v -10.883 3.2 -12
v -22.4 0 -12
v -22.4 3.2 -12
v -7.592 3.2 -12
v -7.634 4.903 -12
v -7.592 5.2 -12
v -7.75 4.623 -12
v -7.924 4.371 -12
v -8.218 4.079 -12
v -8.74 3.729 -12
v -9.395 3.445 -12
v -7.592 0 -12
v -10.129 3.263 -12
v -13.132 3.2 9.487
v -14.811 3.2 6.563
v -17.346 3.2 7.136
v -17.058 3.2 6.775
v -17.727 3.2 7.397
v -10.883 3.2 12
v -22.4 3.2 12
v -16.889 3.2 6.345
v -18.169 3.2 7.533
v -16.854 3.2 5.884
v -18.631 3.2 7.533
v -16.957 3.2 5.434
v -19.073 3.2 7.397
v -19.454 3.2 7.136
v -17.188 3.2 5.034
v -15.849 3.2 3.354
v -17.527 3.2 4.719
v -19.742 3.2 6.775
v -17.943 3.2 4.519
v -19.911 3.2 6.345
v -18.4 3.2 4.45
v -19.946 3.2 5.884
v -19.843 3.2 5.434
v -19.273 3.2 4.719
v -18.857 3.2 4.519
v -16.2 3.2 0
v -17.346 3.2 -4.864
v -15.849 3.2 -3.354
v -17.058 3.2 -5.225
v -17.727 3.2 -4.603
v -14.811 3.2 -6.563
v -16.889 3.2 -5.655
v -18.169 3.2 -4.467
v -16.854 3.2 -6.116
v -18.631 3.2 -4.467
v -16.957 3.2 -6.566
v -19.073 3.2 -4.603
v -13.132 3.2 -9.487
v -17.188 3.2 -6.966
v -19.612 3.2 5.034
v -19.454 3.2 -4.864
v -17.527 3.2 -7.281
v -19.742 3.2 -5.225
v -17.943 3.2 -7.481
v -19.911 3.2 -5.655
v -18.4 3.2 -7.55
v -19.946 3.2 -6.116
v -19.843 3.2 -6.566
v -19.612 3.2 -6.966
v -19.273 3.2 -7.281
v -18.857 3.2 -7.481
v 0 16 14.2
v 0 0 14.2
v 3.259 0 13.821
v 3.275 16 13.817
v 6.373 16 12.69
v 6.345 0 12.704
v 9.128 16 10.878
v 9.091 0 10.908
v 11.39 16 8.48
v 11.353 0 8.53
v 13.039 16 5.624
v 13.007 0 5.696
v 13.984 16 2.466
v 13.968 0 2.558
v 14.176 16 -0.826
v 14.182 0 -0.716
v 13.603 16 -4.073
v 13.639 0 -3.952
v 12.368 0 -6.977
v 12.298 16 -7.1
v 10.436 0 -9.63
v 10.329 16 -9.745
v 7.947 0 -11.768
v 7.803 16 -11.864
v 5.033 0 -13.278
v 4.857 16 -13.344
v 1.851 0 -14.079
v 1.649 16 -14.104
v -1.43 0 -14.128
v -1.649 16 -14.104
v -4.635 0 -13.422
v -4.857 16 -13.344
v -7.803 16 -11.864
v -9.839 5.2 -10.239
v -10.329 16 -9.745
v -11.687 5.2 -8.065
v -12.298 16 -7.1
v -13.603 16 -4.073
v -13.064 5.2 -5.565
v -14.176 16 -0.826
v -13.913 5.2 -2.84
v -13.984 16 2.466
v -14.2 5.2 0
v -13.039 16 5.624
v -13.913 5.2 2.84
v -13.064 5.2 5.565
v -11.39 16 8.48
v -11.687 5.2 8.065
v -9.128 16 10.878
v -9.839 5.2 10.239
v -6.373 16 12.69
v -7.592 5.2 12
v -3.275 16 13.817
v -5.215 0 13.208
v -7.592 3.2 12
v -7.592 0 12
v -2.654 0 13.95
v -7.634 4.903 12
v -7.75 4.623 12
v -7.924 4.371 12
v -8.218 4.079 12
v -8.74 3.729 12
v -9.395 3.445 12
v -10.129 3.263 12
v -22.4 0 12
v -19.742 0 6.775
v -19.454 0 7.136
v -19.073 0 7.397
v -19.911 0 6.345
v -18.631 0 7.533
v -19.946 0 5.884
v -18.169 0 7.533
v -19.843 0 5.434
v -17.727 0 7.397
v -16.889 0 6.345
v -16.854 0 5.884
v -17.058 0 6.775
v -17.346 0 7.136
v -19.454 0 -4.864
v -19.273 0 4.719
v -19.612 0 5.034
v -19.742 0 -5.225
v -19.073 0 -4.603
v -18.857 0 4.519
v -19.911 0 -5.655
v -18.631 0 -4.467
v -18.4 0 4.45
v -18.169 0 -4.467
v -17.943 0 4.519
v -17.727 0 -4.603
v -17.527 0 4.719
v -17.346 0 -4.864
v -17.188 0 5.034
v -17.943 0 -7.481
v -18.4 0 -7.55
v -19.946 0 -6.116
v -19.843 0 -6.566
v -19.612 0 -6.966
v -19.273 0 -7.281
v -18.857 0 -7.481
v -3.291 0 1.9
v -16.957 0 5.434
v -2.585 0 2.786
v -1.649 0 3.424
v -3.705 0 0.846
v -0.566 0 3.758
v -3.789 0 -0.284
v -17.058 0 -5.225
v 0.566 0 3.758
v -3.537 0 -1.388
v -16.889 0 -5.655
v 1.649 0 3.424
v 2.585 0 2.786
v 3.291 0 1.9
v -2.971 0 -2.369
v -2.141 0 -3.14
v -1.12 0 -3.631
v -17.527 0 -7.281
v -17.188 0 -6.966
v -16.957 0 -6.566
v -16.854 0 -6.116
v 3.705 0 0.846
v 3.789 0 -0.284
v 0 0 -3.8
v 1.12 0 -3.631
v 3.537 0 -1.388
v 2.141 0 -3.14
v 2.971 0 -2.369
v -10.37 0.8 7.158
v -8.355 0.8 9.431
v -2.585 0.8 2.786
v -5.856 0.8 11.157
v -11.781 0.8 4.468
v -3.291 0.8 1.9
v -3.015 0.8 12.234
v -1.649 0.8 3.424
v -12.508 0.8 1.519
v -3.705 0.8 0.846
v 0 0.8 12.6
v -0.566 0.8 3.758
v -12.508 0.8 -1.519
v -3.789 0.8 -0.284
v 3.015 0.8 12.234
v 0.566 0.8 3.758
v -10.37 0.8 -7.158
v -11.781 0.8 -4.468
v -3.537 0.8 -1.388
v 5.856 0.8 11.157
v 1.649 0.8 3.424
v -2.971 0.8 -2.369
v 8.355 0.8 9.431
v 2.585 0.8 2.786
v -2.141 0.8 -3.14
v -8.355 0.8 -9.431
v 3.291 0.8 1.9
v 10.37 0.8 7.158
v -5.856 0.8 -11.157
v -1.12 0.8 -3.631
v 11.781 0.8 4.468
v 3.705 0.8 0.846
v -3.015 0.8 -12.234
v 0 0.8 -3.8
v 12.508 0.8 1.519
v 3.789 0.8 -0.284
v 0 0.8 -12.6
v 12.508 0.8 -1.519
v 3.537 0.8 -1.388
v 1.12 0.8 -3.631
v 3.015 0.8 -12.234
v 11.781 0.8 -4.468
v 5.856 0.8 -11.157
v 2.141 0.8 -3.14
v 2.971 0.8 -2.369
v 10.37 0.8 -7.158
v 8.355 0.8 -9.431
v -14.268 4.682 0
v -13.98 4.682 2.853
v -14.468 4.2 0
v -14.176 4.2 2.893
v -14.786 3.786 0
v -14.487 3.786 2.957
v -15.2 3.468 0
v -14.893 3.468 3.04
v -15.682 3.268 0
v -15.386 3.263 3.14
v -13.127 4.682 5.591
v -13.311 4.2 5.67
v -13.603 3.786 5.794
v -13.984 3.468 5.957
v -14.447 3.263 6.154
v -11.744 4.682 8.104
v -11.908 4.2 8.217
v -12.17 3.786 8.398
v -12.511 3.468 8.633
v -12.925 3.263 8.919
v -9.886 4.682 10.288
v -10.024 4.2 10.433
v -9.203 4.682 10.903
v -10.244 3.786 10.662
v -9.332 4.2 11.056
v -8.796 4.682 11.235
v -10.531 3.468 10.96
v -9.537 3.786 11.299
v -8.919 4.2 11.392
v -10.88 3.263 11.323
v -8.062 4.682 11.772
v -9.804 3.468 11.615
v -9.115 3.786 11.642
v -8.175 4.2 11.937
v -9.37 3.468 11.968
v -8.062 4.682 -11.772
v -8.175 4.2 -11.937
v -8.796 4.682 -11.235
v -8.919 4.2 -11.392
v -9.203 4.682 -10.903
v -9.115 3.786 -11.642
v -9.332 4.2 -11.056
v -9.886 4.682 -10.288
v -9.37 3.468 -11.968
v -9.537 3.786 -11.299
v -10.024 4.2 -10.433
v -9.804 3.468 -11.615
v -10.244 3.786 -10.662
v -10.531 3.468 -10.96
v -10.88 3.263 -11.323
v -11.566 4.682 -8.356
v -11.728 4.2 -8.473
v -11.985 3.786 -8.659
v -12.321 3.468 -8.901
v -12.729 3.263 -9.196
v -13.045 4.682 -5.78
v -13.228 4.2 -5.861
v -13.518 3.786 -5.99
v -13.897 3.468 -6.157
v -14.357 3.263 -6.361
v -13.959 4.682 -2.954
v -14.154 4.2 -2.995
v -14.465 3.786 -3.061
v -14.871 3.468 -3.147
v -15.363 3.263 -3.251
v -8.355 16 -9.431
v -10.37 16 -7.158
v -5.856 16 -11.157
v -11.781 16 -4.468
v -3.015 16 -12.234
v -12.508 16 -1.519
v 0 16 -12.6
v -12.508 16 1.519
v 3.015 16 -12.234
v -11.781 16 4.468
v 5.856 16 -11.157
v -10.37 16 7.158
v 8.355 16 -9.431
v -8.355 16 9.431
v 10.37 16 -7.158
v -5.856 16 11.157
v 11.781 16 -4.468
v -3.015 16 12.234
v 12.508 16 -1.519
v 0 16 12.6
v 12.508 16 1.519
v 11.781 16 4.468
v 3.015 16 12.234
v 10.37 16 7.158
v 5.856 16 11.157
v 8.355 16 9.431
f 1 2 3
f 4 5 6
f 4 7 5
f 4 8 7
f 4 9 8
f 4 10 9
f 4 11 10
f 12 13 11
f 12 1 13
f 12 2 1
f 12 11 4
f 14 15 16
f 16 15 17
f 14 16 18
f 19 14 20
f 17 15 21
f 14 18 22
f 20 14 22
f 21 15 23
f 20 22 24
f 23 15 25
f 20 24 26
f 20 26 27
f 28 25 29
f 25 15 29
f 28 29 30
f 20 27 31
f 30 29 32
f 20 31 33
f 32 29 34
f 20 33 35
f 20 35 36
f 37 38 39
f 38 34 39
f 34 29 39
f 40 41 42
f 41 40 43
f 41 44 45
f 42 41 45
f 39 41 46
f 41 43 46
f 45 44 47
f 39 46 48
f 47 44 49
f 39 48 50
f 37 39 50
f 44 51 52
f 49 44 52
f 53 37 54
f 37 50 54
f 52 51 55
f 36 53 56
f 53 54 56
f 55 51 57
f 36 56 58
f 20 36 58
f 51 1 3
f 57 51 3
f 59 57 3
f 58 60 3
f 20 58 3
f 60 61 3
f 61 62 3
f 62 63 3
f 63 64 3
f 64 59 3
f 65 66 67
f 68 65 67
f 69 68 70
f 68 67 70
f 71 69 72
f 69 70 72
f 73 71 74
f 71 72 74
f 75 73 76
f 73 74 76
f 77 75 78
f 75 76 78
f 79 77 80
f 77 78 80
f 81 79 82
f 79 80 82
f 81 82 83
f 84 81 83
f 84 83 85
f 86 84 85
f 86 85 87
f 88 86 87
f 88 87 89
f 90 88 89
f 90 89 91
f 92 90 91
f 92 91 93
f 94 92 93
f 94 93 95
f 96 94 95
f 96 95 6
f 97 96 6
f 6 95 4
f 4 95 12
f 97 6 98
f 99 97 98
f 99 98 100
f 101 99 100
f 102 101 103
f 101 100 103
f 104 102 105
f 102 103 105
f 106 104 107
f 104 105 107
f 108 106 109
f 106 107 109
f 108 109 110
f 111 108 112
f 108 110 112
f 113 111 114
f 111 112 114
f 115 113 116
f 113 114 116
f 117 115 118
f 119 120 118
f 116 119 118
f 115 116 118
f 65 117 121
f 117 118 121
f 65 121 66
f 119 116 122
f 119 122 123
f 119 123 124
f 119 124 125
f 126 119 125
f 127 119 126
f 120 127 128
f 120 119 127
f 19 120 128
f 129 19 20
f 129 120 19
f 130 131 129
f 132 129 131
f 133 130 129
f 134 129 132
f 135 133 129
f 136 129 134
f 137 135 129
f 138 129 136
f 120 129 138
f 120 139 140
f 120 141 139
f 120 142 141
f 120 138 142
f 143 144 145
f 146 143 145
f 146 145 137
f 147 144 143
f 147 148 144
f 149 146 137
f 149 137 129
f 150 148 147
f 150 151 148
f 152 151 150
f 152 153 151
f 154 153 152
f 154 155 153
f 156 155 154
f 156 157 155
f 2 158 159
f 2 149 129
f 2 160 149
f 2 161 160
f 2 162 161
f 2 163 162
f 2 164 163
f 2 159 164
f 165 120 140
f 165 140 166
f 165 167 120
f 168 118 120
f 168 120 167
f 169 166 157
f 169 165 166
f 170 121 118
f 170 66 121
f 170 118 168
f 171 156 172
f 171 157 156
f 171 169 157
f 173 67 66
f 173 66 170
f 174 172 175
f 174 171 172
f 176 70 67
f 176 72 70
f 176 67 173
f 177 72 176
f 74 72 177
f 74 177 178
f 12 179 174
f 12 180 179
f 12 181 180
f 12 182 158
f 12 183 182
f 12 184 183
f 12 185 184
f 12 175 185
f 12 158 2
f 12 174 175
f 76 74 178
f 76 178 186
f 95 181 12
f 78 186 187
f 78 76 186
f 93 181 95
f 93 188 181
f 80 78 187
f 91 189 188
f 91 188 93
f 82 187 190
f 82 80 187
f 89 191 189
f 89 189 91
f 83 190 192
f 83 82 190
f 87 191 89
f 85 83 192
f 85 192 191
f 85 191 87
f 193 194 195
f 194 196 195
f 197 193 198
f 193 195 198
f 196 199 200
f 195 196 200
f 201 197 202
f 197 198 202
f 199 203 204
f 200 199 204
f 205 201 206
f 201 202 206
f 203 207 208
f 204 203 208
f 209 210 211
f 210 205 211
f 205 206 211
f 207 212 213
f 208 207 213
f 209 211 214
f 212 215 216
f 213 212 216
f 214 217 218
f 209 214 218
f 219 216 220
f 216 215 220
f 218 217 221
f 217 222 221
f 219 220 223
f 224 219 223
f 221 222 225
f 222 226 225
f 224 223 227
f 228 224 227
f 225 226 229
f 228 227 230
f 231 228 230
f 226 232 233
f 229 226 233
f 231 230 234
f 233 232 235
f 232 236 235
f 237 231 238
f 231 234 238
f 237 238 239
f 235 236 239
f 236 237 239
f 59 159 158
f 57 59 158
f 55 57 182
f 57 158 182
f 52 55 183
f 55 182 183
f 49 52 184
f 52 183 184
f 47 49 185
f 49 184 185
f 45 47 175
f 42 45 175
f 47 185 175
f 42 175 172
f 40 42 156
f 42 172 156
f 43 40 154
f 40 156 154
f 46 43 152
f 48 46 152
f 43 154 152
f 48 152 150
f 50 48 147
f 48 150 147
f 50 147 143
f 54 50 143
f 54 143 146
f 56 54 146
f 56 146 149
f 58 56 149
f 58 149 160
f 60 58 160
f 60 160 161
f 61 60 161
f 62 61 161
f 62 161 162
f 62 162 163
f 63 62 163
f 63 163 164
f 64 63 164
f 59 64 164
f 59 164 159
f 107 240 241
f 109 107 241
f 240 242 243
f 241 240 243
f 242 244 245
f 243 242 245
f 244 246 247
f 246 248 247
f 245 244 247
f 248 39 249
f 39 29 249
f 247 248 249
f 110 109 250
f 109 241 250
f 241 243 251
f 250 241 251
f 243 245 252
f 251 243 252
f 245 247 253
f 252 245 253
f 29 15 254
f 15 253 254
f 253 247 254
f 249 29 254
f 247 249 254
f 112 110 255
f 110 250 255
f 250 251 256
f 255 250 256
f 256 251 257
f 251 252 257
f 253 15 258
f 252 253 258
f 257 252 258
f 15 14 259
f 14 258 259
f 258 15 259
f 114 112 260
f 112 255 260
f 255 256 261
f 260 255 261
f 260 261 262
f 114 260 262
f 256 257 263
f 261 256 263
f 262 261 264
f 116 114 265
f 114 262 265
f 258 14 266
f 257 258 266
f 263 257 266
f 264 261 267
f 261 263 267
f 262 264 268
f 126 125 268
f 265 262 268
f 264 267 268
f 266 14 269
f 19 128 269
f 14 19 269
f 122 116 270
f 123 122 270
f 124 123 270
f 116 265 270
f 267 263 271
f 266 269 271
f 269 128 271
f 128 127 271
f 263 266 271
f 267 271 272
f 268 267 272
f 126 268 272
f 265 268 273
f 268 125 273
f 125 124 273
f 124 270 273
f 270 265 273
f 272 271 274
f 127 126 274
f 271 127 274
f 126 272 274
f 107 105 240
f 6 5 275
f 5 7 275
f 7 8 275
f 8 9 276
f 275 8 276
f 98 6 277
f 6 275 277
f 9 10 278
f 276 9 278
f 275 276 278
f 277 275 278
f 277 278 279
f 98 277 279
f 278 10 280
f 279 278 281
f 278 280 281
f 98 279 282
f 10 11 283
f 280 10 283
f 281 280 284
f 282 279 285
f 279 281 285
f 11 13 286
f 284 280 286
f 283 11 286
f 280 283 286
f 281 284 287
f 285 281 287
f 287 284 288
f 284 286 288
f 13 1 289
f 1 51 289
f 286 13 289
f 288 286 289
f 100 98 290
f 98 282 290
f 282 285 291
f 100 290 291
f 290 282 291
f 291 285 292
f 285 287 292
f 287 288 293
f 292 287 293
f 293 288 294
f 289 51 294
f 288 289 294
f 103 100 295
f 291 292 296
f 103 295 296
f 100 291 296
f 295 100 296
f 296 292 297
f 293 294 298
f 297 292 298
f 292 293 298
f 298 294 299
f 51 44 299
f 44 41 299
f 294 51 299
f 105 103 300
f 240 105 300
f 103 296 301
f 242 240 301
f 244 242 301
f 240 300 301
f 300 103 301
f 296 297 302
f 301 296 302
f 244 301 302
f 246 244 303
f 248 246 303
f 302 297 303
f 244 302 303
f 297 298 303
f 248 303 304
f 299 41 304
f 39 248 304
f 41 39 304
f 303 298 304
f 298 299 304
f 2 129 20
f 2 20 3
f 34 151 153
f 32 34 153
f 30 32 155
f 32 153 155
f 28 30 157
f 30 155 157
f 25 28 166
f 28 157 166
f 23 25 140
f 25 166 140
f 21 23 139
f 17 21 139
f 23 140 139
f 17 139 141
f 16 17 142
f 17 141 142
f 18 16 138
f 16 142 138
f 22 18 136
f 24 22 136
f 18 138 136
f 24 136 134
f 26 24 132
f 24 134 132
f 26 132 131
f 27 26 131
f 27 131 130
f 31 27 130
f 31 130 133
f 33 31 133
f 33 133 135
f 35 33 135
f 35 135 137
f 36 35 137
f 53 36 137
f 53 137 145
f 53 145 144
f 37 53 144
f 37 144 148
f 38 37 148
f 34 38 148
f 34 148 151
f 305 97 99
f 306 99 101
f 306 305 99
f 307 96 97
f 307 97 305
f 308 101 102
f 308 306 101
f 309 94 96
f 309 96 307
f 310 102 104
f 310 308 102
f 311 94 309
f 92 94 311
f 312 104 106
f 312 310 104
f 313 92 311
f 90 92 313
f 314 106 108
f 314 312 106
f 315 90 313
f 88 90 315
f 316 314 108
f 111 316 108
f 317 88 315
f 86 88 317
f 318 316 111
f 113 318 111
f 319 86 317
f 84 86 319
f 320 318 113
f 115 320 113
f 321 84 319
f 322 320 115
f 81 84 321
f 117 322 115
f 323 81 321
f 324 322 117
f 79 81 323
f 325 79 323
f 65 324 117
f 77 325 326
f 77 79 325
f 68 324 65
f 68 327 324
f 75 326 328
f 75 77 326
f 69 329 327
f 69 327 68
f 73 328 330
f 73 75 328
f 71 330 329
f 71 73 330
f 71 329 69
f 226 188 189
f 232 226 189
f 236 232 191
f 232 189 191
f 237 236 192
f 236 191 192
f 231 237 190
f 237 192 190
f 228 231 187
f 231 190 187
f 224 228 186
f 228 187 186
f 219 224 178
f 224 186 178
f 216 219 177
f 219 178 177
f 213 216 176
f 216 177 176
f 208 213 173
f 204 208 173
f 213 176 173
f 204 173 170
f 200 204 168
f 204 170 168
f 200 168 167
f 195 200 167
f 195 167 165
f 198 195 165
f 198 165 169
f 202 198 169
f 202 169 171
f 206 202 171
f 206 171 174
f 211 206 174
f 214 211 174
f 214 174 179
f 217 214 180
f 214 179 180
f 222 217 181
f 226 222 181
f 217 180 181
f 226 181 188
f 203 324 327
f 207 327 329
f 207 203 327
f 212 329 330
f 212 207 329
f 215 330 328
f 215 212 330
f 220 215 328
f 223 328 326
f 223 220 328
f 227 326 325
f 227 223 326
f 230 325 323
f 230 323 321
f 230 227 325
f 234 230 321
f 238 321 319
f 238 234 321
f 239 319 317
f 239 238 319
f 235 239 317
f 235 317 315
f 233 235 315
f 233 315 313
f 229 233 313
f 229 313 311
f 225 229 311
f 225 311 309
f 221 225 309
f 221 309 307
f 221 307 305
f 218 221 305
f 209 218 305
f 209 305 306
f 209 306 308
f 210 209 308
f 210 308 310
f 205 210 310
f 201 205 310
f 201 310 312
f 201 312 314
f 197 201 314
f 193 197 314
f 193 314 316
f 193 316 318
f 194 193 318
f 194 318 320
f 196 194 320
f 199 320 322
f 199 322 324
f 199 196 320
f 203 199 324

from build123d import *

# Parameters (mm, degrees)
SKETCH1_R           = 14.2
SKETCH1_R_2         = 12.6
BOSS_EXTRUDE1_DEPTH = 16
BOSS_EXTRUDE2_DEPTH = 3.2
SKETCH3_R           = 1.55
CUT_EXTRUDE1_DEPTH  = 10
FILLET1_R           = 2
SKETCH4_R           = 12.6
SKETCH4_R_2         = 3.8
BOSS_EXTRUDE3_DEPTH = 0.8


with BuildPart() as part:
    # Sketch1 → Boss-Extrude1 (new body)
    with BuildSketch(Plane(origin=(0, 0, 0), x_dir=(1, 0, 0), z_dir=(0, 1, 0))):
        with Locations(Location((0, 0, 0), (0, 0, 270))):
            Circle(SKETCH1_R)
        with Locations(Location((0, 0, 0), (0, 0, 270))):
            Circle(SKETCH1_R_2, mode=Mode.SUBTRACT)
    extrude(amount=BOSS_EXTRUDE1_DEPTH)

    # Sketch2 → Boss-Extrude2 (add)
    with BuildSketch(Plane(origin=(0, 0, 0), x_dir=(-1, 0, 0), z_dir=(0, -1, 0))):
        with BuildLine():
            Line((7.592101158, -12), (22.4, -12))
            Line((22.4, -12), (22.4, 12))
            Line((22.4, 12), (7.592101158, 12))
            ThreePointArc((7.592101158, 12), (12.438806945, 6.8495315), (14.2, 0))
            ThreePointArc((14.2, 0), (12.438806945, -6.8495315), (7.592101158, -12))
        make_face()
    extrude(amount=-BOSS_EXTRUDE2_DEPTH)

    # Sketch3 → Cut-Extrude1 (cut)
    with BuildSketch(Plane(origin=(0, 0, 0), x_dir=(-1, 0, 0), z_dir=(0, -1, 0))):
        with Locations(Location((18.4, 6, 0), (0, 0, 90))):
            Circle(SKETCH3_R)
        with Locations(Location((18.4, -6, 0), (0, 0, 90))):
            Circle(SKETCH3_R)
    extrude(amount=-CUT_EXTRUDE1_DEPTH, mode=Mode.SUBTRACT)

    # Fillet1
    fillet1_edges = [part.edges().sort_by_distance(p)[0] for p in [
        (-14.2, 3.2, 0),
    ]]
    fillet(fillet1_edges, radius=FILLET1_R)

    # Sketch4 → Boss-Extrude3 (add)
    with BuildSketch(Plane(origin=(0, 0, 0), x_dir=(-1, 0, 0), z_dir=(0, -1, 0))):
        with Locations(Location((0, 0, 0), (0, 0, 90))):
            Circle(SKETCH4_R)
        with Locations(Location((0, 0, 0), (0, 0, 90))):
            Circle(SKETCH4_R_2, mode=Mode.SUBTRACT)
    extrude(amount=-BOSS_EXTRUDE3_DEPTH)


solid = part.part
